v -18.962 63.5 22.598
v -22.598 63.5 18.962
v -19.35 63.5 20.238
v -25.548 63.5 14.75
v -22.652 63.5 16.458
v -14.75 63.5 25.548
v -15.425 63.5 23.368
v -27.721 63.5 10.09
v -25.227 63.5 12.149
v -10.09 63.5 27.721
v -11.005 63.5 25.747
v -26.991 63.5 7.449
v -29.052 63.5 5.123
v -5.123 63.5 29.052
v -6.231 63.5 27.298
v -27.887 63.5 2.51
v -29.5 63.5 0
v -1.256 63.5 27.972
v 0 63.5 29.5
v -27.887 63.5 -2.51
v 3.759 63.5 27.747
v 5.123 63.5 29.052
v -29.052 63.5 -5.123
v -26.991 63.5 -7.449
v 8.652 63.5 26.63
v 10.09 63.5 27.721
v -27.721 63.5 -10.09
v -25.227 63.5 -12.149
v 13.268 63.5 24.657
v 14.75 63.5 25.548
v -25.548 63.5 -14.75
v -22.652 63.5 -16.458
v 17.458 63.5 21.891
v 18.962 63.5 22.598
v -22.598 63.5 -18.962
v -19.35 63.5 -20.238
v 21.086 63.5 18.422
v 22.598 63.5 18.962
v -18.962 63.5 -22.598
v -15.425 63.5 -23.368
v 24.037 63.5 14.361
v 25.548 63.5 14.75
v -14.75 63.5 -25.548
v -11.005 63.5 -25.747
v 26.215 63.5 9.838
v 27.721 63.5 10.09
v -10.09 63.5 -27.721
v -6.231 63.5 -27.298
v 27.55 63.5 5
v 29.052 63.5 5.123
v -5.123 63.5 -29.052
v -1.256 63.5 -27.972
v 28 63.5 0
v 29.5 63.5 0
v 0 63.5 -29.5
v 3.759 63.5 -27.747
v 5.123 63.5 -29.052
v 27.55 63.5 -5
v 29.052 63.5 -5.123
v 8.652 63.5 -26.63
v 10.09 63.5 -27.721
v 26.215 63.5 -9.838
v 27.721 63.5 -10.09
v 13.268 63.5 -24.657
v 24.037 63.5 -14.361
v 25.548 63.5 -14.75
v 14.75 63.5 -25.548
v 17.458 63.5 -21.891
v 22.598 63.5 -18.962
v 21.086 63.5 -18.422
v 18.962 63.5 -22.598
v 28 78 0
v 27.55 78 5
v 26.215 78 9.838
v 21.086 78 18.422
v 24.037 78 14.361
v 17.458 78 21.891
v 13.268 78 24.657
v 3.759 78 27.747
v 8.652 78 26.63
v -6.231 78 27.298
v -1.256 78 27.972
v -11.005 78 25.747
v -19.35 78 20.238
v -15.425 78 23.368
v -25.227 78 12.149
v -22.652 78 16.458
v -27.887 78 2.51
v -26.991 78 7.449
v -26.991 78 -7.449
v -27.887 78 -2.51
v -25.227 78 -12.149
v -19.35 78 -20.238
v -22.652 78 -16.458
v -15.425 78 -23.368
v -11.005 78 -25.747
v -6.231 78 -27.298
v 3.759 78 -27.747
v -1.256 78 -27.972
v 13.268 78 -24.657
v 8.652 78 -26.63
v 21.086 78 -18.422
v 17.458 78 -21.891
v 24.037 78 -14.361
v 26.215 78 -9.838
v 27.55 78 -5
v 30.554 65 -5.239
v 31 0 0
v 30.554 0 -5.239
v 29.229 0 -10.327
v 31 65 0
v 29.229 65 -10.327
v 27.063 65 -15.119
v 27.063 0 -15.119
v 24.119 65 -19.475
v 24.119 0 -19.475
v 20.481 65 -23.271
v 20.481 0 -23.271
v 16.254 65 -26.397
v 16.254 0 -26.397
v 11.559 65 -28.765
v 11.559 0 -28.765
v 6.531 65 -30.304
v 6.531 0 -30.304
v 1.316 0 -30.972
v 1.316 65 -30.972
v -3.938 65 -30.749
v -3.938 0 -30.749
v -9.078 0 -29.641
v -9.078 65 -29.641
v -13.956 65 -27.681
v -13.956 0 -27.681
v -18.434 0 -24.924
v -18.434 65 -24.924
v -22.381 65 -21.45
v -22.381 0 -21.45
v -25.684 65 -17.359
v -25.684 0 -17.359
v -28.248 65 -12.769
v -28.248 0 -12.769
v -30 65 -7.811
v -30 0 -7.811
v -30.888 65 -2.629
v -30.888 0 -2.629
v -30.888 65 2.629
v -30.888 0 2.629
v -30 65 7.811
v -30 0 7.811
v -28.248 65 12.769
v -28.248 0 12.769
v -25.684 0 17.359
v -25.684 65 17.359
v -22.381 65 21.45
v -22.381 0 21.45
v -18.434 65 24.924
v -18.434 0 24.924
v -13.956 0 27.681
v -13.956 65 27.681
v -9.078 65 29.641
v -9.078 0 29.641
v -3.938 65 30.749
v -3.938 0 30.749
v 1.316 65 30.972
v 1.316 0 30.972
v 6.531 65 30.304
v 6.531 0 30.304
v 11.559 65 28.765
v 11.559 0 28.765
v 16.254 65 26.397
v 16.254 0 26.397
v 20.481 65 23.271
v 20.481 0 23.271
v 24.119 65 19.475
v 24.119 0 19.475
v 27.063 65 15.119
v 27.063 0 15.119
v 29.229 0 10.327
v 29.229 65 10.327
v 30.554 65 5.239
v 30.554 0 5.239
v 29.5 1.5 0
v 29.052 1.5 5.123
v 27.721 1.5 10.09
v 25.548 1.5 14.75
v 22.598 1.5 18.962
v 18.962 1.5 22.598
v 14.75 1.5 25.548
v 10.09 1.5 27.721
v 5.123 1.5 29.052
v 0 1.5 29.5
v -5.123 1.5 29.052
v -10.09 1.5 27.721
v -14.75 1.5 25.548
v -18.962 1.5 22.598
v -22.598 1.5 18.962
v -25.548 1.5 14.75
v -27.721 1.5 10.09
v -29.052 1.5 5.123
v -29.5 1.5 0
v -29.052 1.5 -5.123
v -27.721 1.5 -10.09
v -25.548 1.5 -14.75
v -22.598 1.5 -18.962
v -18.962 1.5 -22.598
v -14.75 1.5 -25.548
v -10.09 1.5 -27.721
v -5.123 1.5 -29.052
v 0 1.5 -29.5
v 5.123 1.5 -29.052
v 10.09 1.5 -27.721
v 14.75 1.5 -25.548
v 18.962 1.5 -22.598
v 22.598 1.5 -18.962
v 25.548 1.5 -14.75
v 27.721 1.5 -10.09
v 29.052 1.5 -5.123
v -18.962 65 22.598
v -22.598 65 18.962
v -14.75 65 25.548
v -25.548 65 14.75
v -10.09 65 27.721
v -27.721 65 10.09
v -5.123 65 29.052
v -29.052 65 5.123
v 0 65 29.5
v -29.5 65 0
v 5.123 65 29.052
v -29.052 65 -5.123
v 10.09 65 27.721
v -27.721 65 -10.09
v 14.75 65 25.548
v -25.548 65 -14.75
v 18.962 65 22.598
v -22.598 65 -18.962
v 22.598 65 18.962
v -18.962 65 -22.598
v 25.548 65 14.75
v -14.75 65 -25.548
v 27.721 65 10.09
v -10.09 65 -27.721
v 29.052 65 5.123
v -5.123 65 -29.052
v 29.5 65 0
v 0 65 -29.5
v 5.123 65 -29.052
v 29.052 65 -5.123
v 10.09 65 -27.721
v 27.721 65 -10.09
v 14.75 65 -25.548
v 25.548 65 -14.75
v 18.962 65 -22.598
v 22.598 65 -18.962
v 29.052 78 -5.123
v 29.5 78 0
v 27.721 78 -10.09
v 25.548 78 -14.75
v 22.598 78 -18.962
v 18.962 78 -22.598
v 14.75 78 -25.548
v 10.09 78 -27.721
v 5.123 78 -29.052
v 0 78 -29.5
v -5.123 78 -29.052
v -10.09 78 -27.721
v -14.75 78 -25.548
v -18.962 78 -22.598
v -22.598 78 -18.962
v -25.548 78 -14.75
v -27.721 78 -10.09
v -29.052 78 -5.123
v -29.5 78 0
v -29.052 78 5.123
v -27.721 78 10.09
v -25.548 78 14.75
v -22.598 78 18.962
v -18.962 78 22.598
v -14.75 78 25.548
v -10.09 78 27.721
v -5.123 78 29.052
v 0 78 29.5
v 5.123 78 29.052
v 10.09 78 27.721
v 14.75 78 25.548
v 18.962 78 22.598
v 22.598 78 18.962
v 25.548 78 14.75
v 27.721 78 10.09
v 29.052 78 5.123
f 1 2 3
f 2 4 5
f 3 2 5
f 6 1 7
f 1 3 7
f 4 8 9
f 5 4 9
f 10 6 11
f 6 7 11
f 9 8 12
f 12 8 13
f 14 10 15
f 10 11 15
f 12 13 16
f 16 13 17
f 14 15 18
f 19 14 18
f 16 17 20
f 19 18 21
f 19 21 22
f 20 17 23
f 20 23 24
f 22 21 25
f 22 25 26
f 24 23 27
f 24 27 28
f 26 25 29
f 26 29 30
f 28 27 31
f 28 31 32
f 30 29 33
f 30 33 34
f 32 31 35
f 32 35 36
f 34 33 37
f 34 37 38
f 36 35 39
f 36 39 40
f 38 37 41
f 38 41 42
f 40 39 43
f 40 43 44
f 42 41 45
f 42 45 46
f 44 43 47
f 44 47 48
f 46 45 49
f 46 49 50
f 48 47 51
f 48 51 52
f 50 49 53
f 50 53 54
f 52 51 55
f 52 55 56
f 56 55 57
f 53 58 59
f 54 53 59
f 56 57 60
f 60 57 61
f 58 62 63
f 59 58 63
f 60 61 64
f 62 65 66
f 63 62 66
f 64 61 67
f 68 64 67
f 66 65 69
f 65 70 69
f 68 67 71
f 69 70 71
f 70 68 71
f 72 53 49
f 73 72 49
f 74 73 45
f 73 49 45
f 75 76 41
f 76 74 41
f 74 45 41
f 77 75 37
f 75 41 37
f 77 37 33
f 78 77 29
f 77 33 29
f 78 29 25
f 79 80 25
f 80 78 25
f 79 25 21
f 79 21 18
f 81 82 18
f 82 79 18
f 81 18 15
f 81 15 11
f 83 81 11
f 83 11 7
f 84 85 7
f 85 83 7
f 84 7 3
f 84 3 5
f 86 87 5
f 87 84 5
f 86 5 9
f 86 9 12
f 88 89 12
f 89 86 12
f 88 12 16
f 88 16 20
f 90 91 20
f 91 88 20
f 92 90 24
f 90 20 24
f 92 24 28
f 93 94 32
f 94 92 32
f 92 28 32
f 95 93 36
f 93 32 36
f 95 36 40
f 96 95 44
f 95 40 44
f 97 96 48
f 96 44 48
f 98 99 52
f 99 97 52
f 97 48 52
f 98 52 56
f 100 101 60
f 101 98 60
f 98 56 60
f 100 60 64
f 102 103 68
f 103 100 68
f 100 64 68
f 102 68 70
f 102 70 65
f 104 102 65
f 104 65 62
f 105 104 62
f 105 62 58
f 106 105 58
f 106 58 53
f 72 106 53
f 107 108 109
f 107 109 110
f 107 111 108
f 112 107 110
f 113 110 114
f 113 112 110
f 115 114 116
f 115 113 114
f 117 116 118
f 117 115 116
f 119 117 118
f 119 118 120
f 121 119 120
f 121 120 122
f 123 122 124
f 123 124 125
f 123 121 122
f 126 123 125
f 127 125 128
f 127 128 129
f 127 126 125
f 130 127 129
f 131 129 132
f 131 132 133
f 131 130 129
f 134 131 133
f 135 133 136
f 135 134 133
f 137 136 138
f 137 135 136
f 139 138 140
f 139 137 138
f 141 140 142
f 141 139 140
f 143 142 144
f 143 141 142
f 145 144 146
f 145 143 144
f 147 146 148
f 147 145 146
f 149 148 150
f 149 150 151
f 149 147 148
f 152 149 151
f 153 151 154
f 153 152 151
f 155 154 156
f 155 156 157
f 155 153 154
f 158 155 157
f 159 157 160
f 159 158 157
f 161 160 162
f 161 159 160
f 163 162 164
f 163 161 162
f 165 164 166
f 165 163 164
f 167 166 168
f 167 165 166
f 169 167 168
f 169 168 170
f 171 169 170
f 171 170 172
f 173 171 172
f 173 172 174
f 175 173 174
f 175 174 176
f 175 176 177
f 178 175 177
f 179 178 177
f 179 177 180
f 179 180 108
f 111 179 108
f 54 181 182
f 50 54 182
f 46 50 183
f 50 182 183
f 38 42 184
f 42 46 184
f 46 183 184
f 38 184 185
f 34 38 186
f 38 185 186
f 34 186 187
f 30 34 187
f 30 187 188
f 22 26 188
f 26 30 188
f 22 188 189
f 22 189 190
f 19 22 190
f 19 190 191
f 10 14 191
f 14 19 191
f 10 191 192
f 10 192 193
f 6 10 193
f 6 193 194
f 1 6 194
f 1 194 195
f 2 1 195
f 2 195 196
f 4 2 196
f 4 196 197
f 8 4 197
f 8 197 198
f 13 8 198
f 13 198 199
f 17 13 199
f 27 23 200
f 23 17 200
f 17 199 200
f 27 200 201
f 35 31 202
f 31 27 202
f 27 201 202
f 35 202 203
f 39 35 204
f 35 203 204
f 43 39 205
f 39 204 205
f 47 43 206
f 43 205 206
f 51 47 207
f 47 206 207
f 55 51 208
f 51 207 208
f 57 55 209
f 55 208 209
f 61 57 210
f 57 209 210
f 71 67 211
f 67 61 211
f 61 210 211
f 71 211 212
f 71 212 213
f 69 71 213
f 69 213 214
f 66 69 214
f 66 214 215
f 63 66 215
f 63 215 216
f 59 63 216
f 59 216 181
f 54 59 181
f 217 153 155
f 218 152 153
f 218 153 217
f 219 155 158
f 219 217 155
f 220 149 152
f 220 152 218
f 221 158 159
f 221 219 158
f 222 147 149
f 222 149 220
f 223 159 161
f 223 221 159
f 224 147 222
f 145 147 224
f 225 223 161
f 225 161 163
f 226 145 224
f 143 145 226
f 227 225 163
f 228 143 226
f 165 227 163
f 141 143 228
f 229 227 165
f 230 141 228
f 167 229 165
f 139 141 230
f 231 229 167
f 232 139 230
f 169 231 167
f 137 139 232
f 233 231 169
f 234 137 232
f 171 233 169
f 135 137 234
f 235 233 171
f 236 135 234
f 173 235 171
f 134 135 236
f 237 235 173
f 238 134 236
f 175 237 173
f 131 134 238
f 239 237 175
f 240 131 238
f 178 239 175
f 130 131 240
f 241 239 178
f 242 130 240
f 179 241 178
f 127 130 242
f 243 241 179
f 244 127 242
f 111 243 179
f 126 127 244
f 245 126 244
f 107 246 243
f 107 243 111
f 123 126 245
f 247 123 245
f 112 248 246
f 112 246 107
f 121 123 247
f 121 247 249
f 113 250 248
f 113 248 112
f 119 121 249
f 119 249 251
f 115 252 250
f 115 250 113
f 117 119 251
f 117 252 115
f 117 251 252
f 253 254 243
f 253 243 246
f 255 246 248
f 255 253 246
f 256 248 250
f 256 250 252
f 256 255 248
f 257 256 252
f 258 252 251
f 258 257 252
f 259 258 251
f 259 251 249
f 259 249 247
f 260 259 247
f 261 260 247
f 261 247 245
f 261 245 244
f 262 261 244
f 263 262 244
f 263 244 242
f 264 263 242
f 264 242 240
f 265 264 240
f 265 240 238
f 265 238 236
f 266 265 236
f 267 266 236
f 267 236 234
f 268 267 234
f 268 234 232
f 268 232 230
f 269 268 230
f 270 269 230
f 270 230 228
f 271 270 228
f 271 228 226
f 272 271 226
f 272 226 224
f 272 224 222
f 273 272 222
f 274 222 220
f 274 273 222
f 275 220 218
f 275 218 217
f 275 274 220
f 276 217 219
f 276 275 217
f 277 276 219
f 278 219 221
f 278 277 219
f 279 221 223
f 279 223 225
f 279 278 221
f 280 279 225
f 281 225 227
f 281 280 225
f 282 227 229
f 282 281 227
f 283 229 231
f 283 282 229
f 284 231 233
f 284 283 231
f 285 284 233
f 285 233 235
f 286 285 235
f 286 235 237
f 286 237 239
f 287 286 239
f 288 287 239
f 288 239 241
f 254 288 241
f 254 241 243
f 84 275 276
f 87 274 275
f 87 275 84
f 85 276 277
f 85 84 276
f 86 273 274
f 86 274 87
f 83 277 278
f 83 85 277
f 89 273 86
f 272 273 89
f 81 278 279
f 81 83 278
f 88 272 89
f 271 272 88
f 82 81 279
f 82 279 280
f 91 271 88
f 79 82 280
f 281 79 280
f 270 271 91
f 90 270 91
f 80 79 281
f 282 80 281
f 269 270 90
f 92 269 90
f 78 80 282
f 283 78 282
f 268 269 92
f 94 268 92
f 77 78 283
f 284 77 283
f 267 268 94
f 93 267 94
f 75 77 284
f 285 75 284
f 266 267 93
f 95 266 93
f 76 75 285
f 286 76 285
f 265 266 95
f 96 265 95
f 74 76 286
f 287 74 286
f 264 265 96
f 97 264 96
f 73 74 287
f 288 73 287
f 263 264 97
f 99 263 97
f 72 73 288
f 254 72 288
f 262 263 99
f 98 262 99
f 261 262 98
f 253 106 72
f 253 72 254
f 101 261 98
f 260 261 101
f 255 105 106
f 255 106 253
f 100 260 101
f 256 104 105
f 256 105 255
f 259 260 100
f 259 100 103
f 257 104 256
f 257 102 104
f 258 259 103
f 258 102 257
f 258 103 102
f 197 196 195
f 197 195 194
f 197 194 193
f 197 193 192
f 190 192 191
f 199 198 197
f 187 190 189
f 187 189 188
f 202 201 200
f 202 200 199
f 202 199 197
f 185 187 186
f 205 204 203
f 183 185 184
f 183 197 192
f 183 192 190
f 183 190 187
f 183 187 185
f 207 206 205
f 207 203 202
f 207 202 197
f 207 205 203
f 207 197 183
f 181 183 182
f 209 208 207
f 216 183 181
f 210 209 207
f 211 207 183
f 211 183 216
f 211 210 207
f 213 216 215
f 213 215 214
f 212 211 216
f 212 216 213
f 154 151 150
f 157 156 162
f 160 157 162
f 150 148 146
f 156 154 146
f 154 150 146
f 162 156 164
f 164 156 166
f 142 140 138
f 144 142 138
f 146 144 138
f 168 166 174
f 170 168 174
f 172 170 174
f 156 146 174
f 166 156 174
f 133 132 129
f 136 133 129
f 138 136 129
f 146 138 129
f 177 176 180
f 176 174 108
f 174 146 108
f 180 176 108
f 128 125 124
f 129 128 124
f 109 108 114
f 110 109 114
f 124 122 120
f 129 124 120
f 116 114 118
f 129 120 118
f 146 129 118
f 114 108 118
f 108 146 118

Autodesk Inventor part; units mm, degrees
ref_plane "YZ Plane" through (0, 0, 0) normal (1, 0, 0) x (0, 1, 0)
ref_plane "XZ Plane" through (0, 0, 0) normal (0, 1, 0) x (-1, 0, 0)
ref_plane "XY Plane" through (0, 0, 0) normal (0, 0, 1) x (1, 0, 0)
sketch "Sketch1" plane through (0, 0, 0) normal (0, 0, 1) x (1, 0, 0)
  line L0 (0, 0) -> (31, 0)
  line L1 (31, 0) -> (31, 65)
  line L2 (31, 65) -> (29.5, 65)
  line L3 (29.5, 65) -> (29.5, 78)
  line L4 (29.5, 78) -> (28, 78)
  line L5 (28, 76.5) -> (28, 76.5)
  line L6 (28, 78) -> (28, 63.5)
  line L7 (28, 63.5) -> (29.5, 63.5)
  line L8 (29.5, 63.5) -> (29.5, 1.5)
  line L9 (29.5, 1.5) -> (0, 1.5)
  line L10 (0, 0) -> (0, 76.5) construction
  line L11 (0, 0) -> (0, 1.5)
  dimension "d1" = 31
  dimension "d2" = 65
  dimension "d3" = 1.5
  dimension "d4" = 13
  dimension "d5" = 1.5
  dimension "d6" = 1.5
revolve "Revolution1" add sketch "Sketch1" angle 360 about axis through (0, 0, 0) along (0, 1, 0)
properties part number "yellow_base"
